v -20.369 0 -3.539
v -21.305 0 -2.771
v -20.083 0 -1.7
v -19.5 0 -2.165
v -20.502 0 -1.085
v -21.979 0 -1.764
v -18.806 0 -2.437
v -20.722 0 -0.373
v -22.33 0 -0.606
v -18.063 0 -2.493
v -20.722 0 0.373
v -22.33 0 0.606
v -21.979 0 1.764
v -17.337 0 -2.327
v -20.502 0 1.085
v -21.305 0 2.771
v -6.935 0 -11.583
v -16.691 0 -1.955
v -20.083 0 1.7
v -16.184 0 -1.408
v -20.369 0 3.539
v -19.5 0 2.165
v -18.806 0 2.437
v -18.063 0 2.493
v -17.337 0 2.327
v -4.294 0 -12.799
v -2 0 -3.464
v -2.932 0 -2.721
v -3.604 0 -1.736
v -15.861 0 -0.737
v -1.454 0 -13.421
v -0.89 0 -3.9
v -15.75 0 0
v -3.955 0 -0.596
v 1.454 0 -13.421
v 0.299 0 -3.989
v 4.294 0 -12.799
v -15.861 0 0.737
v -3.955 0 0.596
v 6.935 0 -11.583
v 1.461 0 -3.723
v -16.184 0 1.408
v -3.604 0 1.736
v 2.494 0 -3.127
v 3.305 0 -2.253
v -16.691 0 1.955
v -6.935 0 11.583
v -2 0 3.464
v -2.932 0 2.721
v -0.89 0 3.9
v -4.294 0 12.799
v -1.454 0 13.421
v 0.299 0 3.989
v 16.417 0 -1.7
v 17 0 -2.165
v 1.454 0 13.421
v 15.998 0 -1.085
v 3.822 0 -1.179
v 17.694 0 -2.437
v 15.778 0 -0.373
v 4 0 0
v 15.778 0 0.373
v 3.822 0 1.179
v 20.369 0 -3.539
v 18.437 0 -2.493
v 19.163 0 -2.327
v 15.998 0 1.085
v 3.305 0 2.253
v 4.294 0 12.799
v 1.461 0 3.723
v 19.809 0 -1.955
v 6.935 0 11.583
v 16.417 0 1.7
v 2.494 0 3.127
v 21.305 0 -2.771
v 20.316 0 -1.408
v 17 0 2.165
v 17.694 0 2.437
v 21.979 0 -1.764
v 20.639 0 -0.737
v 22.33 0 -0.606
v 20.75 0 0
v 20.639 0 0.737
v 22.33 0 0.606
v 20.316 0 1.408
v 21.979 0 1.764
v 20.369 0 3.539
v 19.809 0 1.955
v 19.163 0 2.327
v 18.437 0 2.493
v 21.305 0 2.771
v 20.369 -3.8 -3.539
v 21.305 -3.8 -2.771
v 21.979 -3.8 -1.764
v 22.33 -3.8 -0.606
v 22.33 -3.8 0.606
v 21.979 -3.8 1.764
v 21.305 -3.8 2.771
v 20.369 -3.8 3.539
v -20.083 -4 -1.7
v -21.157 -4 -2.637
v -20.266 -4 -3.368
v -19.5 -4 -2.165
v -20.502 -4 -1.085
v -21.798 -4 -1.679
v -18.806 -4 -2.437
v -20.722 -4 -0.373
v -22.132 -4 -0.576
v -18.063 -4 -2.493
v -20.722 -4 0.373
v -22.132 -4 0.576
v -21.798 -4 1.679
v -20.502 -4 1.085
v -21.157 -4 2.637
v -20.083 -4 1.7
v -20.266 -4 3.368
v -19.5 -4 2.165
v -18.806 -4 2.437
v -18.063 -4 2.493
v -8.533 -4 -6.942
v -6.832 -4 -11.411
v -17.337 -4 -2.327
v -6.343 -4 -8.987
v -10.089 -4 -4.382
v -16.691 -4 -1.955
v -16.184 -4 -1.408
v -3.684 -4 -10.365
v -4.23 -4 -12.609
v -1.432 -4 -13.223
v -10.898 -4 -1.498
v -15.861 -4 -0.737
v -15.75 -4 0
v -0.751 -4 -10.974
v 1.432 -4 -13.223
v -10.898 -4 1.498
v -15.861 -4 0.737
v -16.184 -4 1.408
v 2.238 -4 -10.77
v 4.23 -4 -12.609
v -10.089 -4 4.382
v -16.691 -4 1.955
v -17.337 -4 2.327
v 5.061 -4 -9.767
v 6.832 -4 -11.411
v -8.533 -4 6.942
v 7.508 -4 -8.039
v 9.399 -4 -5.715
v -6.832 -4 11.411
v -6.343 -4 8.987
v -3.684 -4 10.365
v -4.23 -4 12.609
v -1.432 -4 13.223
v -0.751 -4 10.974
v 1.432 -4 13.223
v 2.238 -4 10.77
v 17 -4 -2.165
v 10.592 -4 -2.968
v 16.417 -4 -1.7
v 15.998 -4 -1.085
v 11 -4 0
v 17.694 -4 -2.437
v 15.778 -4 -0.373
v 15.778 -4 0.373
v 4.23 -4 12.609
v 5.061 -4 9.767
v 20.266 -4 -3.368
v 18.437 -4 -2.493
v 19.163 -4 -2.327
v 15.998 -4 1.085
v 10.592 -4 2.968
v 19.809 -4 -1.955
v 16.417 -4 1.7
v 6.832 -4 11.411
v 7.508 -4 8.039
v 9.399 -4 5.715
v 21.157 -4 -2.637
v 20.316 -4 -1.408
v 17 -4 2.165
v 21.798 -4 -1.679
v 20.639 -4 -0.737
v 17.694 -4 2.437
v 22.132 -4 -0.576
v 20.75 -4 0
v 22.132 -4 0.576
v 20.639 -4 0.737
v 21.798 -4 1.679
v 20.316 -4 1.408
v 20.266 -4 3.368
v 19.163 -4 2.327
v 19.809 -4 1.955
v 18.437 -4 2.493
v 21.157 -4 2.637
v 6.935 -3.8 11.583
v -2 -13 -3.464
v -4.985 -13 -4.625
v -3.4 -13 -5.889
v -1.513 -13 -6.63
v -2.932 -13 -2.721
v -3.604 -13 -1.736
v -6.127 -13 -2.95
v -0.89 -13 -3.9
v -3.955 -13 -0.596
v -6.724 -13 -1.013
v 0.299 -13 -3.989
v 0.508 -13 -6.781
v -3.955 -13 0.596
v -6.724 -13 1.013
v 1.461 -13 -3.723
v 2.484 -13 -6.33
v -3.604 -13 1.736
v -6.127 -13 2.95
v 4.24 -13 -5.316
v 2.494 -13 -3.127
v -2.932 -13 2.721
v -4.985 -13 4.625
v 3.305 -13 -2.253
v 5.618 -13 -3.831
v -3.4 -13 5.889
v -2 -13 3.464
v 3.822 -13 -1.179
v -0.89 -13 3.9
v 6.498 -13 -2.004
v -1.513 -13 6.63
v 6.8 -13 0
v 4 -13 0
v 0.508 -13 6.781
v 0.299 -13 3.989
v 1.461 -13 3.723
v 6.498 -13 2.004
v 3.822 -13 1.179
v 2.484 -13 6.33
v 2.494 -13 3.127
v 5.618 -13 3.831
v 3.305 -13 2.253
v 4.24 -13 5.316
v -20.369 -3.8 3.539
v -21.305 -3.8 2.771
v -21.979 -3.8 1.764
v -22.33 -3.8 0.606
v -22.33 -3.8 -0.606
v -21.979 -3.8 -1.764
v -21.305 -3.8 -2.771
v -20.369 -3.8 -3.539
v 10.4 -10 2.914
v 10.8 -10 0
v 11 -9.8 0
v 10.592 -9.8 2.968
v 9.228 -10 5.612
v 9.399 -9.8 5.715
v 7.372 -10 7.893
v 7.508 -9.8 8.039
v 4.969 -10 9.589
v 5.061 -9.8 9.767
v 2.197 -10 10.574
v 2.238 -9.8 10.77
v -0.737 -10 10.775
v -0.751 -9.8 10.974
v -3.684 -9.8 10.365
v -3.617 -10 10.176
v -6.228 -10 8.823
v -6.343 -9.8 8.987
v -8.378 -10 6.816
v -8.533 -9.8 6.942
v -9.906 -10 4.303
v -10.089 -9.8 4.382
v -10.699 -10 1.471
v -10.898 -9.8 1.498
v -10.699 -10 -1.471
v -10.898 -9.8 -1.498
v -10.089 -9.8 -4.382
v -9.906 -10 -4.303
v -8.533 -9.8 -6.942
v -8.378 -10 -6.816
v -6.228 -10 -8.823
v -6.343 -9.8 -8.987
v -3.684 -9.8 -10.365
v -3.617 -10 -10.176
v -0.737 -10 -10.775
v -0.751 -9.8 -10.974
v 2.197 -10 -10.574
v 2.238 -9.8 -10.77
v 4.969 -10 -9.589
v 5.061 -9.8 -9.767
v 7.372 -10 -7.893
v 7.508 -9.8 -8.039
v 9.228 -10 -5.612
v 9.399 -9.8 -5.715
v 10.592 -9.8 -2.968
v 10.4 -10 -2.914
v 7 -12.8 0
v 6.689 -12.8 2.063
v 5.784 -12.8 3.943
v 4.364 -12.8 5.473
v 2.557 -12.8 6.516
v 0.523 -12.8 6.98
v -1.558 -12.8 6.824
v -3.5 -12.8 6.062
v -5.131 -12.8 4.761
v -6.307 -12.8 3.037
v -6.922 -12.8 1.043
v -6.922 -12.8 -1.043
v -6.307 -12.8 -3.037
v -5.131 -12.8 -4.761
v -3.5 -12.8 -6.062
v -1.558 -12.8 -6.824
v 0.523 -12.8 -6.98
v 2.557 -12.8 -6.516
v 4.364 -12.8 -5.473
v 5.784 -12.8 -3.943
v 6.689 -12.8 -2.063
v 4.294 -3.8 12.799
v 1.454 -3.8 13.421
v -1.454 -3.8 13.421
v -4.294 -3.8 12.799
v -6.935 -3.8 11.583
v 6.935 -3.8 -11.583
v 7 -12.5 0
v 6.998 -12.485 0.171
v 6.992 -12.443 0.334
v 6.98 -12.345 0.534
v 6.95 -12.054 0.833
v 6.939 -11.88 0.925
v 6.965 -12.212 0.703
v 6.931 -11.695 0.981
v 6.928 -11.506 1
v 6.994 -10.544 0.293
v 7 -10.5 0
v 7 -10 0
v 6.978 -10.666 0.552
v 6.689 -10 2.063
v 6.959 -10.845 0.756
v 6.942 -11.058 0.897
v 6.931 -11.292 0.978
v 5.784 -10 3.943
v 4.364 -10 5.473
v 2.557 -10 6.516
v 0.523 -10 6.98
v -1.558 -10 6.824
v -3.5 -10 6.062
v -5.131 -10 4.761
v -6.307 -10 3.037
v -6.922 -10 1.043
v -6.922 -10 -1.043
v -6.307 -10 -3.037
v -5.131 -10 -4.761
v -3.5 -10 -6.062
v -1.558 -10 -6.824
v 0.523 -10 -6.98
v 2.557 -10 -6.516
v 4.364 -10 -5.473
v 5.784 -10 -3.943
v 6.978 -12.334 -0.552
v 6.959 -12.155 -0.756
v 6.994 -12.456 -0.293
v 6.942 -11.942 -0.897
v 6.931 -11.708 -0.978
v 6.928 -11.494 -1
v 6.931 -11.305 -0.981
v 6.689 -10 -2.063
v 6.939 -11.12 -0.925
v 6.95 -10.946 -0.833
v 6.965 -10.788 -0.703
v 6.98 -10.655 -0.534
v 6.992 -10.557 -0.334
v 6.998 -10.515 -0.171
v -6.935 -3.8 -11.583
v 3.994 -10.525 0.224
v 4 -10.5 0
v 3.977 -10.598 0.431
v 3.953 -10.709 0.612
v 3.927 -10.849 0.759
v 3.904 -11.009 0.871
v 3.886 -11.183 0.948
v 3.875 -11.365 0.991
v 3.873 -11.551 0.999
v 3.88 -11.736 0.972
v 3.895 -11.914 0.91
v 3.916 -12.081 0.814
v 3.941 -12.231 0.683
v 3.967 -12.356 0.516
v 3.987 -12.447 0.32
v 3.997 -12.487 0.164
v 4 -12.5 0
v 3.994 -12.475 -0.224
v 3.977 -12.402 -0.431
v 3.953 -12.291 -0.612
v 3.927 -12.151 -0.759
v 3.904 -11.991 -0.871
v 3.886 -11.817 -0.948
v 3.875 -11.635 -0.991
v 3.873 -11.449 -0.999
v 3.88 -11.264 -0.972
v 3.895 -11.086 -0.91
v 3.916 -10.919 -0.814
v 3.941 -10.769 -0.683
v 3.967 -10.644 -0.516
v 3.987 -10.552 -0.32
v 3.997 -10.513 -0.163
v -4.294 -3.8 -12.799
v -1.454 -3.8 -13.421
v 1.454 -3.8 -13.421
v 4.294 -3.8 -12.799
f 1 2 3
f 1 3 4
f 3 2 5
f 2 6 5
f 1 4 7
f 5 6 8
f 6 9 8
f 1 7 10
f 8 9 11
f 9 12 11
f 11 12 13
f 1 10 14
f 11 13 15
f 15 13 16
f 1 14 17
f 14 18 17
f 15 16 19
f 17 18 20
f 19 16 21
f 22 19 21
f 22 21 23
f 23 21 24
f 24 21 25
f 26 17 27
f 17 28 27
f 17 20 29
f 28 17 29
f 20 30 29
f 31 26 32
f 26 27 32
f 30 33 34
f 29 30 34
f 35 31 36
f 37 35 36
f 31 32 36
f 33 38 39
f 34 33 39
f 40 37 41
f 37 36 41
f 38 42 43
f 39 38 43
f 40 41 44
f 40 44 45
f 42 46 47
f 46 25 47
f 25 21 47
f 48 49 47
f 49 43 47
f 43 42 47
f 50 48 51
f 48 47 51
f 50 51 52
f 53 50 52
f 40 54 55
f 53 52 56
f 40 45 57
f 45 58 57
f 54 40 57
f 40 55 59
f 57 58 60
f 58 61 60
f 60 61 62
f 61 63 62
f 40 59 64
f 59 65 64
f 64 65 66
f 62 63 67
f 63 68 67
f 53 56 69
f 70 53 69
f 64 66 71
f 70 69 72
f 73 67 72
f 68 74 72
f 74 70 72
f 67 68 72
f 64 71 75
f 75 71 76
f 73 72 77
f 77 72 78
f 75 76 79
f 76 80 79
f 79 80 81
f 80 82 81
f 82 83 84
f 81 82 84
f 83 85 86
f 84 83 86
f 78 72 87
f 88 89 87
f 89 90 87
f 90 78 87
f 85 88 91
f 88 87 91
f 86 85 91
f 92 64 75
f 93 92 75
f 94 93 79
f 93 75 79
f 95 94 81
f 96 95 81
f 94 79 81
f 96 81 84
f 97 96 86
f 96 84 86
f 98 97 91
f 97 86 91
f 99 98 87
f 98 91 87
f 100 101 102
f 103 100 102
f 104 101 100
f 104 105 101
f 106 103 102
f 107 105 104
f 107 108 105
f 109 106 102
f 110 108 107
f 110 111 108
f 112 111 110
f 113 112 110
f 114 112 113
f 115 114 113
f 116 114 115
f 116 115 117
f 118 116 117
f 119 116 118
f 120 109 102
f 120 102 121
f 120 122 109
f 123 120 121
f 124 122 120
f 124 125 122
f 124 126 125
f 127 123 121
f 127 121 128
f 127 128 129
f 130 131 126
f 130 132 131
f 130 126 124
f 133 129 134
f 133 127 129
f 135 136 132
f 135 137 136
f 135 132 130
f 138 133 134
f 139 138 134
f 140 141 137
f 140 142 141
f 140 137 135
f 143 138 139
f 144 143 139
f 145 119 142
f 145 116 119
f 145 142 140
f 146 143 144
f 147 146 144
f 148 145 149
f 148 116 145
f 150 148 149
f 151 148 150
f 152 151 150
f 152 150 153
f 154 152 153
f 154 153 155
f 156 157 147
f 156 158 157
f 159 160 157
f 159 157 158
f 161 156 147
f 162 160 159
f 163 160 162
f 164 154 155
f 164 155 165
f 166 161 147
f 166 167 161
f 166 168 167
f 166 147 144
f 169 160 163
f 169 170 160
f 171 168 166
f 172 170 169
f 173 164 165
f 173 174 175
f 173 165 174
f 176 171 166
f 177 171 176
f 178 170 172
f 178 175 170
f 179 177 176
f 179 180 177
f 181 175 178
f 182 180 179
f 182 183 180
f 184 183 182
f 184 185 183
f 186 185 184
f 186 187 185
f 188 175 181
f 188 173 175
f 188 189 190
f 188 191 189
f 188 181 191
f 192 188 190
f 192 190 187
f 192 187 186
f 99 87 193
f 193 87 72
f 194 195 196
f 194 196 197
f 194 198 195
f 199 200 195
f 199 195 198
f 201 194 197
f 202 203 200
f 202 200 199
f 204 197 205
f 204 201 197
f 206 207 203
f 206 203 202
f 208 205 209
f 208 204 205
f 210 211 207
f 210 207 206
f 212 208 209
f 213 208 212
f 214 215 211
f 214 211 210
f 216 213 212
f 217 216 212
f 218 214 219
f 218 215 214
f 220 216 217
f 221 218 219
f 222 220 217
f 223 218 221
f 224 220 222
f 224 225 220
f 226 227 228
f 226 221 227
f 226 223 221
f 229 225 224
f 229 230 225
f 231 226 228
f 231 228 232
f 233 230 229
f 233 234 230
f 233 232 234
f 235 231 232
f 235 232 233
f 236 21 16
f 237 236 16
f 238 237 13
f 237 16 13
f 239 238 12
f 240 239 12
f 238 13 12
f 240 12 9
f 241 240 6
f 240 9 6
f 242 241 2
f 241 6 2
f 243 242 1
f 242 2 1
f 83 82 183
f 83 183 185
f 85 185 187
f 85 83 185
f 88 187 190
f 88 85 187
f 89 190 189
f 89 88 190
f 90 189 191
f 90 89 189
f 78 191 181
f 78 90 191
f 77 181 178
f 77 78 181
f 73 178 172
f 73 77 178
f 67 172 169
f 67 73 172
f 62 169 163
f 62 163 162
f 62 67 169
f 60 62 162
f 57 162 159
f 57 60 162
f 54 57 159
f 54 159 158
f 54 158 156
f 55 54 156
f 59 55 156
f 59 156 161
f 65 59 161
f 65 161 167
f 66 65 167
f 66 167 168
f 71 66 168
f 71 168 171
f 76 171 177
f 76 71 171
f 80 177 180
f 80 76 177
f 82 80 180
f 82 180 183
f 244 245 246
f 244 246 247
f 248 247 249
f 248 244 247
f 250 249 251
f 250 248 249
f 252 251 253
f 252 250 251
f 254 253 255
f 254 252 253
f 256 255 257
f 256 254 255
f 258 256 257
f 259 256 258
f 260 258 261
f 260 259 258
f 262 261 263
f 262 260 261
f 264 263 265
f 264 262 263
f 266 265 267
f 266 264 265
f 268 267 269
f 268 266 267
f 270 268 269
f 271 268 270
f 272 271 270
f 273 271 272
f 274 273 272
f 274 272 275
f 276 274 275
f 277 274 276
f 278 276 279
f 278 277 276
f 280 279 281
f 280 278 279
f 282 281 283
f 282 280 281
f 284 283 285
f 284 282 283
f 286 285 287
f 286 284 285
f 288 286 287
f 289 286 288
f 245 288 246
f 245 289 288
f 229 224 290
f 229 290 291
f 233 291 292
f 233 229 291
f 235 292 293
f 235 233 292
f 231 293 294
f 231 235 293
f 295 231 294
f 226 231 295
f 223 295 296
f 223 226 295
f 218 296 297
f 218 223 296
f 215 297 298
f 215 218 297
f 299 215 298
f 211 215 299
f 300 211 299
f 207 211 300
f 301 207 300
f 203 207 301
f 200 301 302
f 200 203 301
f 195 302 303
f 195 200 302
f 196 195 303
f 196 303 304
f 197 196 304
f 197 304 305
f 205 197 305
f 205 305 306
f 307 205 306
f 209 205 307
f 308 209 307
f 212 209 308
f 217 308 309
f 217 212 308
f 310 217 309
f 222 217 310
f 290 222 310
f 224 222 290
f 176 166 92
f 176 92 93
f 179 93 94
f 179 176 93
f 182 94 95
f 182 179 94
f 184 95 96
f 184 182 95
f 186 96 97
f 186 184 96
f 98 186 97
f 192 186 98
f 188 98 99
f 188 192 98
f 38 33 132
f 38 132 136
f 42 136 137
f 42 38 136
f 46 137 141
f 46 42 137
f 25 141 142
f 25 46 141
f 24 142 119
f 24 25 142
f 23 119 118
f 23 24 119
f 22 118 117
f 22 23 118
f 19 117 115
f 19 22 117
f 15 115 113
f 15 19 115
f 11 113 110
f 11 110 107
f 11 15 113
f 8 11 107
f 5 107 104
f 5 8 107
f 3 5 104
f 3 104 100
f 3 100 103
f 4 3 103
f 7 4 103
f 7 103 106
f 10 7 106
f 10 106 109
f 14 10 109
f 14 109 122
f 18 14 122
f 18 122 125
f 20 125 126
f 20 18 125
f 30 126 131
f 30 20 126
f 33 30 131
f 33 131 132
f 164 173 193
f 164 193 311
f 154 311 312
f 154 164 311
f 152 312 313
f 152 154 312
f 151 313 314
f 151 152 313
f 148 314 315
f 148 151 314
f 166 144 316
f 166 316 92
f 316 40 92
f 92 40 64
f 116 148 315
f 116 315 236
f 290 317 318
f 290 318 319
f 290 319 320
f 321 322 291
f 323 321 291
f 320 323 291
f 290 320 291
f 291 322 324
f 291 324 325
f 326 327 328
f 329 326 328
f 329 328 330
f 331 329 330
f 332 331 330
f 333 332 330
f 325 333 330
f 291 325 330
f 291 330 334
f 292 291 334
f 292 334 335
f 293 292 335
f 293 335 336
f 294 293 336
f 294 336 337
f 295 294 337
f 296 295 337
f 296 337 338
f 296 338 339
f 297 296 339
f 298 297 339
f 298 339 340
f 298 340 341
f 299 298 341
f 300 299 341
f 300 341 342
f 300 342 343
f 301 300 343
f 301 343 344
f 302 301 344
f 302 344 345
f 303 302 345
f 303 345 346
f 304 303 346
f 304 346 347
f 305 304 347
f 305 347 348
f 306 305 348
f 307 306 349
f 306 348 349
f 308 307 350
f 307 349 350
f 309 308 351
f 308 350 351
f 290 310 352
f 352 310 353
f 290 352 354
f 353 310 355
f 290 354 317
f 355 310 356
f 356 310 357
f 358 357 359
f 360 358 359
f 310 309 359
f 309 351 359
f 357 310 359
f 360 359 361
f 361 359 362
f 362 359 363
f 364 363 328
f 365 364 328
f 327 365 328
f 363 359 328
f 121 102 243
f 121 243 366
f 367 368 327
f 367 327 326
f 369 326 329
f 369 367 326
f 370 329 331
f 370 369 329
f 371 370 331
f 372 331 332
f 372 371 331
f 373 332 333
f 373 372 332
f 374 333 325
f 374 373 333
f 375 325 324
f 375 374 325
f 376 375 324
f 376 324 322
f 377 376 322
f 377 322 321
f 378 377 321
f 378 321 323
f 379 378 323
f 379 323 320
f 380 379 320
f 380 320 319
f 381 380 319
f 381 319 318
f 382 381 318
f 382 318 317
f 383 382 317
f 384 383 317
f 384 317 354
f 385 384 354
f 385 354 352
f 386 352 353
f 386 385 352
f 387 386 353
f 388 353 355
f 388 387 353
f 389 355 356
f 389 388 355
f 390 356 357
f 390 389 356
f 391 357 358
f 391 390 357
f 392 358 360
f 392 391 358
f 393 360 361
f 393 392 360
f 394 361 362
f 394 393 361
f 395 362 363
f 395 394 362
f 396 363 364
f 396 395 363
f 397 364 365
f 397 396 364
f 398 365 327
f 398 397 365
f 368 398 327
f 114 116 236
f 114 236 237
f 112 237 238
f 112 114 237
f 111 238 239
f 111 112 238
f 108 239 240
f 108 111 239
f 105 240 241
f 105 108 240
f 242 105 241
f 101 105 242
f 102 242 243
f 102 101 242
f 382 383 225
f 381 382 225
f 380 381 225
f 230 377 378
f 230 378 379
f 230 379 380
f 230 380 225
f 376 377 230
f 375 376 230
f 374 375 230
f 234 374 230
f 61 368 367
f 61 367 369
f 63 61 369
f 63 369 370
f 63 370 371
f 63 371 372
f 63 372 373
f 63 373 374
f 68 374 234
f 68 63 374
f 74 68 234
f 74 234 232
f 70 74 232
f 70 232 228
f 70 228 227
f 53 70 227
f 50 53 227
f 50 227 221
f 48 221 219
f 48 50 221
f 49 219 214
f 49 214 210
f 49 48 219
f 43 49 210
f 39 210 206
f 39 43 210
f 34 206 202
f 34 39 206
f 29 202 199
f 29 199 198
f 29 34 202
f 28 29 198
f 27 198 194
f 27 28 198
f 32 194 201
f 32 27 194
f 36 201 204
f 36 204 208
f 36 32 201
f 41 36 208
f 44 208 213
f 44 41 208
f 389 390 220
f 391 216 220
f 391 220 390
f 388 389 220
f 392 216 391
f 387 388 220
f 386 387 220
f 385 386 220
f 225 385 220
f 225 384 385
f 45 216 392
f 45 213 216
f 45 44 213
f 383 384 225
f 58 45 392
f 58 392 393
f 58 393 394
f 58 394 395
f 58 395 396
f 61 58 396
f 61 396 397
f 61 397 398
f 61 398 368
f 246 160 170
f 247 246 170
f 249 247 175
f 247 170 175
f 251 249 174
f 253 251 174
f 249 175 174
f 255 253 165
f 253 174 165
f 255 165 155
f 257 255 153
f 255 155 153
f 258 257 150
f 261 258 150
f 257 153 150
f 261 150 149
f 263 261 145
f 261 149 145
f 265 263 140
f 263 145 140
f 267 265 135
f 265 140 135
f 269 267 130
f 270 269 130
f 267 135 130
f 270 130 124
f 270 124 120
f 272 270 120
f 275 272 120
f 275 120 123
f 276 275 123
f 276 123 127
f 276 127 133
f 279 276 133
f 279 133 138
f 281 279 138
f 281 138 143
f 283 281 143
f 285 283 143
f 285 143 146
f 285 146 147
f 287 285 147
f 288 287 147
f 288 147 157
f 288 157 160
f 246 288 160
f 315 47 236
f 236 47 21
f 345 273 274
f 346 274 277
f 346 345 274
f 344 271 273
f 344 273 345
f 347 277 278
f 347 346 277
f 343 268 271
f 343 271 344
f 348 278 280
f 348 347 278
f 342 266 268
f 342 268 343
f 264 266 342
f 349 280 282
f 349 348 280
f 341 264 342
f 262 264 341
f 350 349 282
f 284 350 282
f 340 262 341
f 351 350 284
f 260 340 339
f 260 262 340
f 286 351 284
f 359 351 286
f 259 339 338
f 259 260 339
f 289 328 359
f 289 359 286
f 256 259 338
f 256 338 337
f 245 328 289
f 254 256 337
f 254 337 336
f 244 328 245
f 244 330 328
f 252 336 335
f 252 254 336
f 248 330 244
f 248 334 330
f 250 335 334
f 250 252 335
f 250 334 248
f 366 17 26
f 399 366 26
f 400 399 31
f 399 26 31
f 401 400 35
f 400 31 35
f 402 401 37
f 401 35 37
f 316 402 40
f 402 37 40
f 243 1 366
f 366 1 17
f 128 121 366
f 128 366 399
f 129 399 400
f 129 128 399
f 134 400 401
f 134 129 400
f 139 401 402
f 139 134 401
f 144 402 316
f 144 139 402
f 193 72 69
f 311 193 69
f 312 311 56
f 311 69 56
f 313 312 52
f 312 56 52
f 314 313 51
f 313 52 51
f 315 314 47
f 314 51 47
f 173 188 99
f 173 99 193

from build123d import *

# Parameters (mm, degrees)
F0_R     = 2.5
F0_R_2   = 11
F1_DEPTH = 4
F0_R_3   = 7
F0_R_4   = 4
F2_DEPTH = 13
F3_DEPTH = 10
F4_R     = 1
F5_DEPTH = 8
F6_SIZE  = 0.2
F7_SIZE  = 0.2
F8_SIZE  = 0.2


with BuildPart() as f1:
    # F0 (on Front) → F1 (new body)
    with BuildSketch(Plane.XZ):
        with BuildLine():
            Line((-20.369007, -3.539129), (-6.934932, -11.582604))
            ThreePointArc((-6.934932, -11.582604), (0, -13.5), (6.934932, -11.582604))
            Line((6.934932, -11.582604), (20.369007, -3.539129))
            ThreePointArc((20.369007, -3.539129), (22.375, 0), (20.369007, 3.539129))
            Line((20.369007, 3.539129), (6.934932, 11.582604))
            ThreePointArc((6.934932, 11.582604), (0, 13.5), (-6.934932, 11.582604))
            Line((-6.934932, 11.582604), (-20.369007, 3.539129))
            ThreePointArc((-20.369007, 3.539129), (-22.375, 0), (-20.369007, -3.539129))
        make_face()
        with Locations((-18.25, 0)):
            Circle(F0_R, mode=Mode.SUBTRACT)
        Circle(F0_R_2, mode=Mode.SUBTRACT)
        with Locations((18.25, 0)):
            Circle(F0_R, mode=Mode.SUBTRACT)
    extrude(amount=F1_DEPTH)



with BuildPart() as f2:
    # F0 (on Front) → F2 (new body)
    with BuildSketch(Plane.XZ):
        Circle(F0_R_3)
        Circle(F0_R_4, mode=Mode.SUBTRACT)
    extrude(amount=F2_DEPTH)


with BuildPart() as f1_1:
    add(f1.part)

    add(f2.part)  # F3 merges F2
    # F0 (on Front) → F3 (join)
    with BuildSketch(Plane.XZ):
        Circle(F0_R_2)
        Circle(F0_R_3, mode=Mode.SUBTRACT)
    extrude(amount=F3_DEPTH)

    # F4 (on Right) → F5 (cut)
    with BuildSketch(Plane.YZ):
        with Locations((-11.5, 0)):
            Circle(F4_R)
    extrude(amount=F5_DEPTH, mode=Mode.SUBTRACT)

    # F6
    f6_edges = [f1_1.edges().sort_by_distance(p)[0] for p in [
        (-11, -10, 0),
    ]]
    chamfer(f6_edges, length=F6_SIZE)

    # F7
    f7_edges = [f1_1.edges().sort_by_distance(p)[0] for p in [
        (-7, -13, 0),
    ]]
    chamfer(f7_edges, length=F7_SIZE)

    # F8
    f8_edges = [f1_1.edges().sort_by_distance(p)[0] for p in [
        (13.651969, -4, -7.560867),
        (13.651969, -4, 7.560867),
        (22.375, -4, 0),
        (0, -4, -13.5),
        (0, -4, 13.5),
        (-13.651969, -4, 7.560867),
        (-13.651969, -4, -7.560867),
        (-22.375, -4, 0),
    ]]
    chamfer(f8_edges, length=F8_SIZE)


solid = f1_1.part
